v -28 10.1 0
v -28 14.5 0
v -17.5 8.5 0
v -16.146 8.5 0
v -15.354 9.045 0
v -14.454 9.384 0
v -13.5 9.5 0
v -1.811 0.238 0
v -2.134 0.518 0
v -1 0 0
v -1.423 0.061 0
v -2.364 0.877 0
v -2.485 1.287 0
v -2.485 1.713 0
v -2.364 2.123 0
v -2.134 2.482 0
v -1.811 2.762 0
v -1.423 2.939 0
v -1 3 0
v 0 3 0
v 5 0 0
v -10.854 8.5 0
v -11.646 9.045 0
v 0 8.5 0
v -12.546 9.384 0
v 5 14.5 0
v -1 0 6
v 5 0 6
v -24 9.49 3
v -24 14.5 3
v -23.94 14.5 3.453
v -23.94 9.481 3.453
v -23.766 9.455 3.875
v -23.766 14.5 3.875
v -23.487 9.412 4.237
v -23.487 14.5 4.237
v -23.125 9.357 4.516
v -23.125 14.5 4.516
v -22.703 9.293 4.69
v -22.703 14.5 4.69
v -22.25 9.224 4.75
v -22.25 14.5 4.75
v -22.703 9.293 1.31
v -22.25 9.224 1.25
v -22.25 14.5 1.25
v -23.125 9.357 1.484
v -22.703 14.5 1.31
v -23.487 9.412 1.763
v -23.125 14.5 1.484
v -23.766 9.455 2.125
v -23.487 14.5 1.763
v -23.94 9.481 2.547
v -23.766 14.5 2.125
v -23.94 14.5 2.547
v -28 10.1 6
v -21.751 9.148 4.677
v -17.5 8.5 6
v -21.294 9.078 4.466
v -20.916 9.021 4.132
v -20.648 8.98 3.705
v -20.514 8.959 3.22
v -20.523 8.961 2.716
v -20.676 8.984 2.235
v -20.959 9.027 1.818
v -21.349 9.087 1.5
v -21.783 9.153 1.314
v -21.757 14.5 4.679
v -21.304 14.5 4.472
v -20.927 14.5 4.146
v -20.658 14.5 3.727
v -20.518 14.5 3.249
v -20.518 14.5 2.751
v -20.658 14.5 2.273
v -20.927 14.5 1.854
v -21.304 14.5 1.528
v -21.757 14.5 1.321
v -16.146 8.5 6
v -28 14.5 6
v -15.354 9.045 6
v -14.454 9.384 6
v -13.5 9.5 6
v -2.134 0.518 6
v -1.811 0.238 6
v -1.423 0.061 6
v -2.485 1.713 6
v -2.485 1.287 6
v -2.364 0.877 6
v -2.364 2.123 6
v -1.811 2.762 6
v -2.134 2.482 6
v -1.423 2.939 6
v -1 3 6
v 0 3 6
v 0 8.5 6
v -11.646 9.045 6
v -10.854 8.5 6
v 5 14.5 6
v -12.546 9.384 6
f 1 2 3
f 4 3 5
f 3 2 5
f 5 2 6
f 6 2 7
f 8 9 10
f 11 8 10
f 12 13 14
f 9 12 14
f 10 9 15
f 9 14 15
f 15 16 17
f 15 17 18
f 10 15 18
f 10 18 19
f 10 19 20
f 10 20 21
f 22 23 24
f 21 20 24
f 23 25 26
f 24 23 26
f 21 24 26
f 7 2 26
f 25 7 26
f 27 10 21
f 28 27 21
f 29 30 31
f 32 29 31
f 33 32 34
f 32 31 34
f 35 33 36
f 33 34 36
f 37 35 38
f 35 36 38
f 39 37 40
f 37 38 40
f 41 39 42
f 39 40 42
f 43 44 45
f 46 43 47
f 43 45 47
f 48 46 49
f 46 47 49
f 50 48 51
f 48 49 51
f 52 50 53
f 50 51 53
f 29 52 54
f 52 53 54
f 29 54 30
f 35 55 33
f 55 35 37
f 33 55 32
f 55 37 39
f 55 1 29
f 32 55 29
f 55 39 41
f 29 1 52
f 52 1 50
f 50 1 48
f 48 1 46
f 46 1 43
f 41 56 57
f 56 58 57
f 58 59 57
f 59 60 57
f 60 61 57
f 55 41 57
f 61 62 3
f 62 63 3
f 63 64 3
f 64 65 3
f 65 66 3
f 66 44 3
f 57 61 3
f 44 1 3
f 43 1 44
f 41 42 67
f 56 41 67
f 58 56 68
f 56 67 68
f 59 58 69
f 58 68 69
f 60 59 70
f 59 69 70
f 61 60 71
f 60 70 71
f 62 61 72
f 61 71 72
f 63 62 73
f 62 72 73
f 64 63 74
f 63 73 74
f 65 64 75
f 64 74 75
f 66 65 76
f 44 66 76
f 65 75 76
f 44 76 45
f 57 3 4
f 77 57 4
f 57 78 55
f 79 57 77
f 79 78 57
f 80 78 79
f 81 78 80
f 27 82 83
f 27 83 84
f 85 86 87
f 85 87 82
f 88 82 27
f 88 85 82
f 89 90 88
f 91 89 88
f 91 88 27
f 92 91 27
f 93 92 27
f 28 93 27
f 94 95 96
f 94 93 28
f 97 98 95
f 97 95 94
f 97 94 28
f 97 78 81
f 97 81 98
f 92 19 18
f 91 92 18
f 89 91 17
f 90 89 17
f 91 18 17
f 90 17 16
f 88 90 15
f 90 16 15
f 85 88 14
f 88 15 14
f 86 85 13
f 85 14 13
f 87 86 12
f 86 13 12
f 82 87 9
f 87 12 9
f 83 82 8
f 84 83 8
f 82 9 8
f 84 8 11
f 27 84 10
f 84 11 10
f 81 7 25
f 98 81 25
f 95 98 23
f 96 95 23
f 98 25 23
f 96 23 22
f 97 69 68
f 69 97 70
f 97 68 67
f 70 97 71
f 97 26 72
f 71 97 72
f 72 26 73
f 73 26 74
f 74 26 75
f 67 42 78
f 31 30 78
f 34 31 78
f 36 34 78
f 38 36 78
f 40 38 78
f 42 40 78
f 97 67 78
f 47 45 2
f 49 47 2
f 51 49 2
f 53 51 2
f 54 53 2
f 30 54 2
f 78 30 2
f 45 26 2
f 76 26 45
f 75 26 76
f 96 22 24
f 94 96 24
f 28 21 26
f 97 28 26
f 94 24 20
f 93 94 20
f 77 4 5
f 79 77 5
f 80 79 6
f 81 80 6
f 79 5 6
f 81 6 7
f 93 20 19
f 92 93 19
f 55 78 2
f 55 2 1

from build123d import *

# Parameters (mm, degrees)
F1_DEPTH    = 6
F3_DEPTH    = 25
F4_T1_DEPTH = 60.5769524325


# Not quite as in the source:
# - a fillet or chamfer that OpenCascade refuses, or shapes differently, is made with other operations: its cross-section is extruded or revolved along the edge and cut away or added
# - a feature names something its author has since deleted; it is built from what else it names


with BuildPart() as f1:
    # F0 (on Top) → F1 (new body)
    with BuildSketch(Plane.XY):
        with BuildLine():
            Line((-1, 0), (0, 0))
            Line((0, 0), (5, 0))
            Line((5, 0), (5, 14.5))
            Line((5, 14.5), (-28, 14.5))
            Line((-28, 14.5), (-28, 9.5))
            Line((-28, 9.5), (-13.5, 9.5))
            Line((-13.5, 9.5), (0, 9.5))
            Line((0, 9.5), (0, 8.5))
            Line((0, 8.5), (0, 3))
            Line((0, 3), (-1, 3))
            ThreePointArc((-1, 3), (-2.5, 1.5), (-1, 0))
        make_face()
        with BuildLine():
            Line((-10.8542486889, 8.5), (0, 8.5))
            Line((0, 8.5), (0, 9.5))
            Line((0, 9.5), (-13.5, 9.5))
            ThreePointArc((-13.5, 9.5), (-12.0857864376, 9.2416573868), (-10.8542486889, 8.5))
        make_face()
        with BuildLine():
            Line((-13.5, 9.5), (-28, 9.5))
            Line((-28, 9.5), (-28, 8.5))
            Line((-28, 8.5), (-16.1457513111, 8.5))
            ThreePointArc((-16.1457513111, 8.5), (-14.9142135624, 9.2416573868), (-13.5, 9.5))
        make_face()
    extrude(amount=F1_DEPTH)

    # F2 (on face) → F3 (cut)
    with BuildSketch(Plane(origin=(0, 14.5, 0), x_dir=(-1, 0, 0), z_dir=(0, 1, 0))):
        with BuildLine():
            ThreePointArc((22.25, 1.25), (23.4874368671, 1.7625631329), (24, 3))
            ThreePointArc((24, 3), (23.4874368671, 4.2374368671), (22.25, 4.75))
            Line((22.25, 4.75), (22.25, 1.25))
        make_face()
        with BuildLine():
            Line((22.25, 1.25), (22.25, 4.75))
            ThreePointArc((22.25, 4.75), (20.5, 3), (22.25, 1.25))
        make_face()
    extrude(amount=-F3_DEPTH, mode=Mode.SUBTRACT)

    # F4: chamfer of 10.5 x 1.6 on 1 edges, made by hand

    # F4_s2 → F4_t1 (cut)
    with BuildSketch(Plane.XY.offset(-27.2884762162)):
        Polygon((-28, 10.1), (-17.5, 8.5), (-28, 8.5), align=None)
    extrude(amount=F4_T1_DEPTH, mode=Mode.SUBTRACT)


solid = f1.part
